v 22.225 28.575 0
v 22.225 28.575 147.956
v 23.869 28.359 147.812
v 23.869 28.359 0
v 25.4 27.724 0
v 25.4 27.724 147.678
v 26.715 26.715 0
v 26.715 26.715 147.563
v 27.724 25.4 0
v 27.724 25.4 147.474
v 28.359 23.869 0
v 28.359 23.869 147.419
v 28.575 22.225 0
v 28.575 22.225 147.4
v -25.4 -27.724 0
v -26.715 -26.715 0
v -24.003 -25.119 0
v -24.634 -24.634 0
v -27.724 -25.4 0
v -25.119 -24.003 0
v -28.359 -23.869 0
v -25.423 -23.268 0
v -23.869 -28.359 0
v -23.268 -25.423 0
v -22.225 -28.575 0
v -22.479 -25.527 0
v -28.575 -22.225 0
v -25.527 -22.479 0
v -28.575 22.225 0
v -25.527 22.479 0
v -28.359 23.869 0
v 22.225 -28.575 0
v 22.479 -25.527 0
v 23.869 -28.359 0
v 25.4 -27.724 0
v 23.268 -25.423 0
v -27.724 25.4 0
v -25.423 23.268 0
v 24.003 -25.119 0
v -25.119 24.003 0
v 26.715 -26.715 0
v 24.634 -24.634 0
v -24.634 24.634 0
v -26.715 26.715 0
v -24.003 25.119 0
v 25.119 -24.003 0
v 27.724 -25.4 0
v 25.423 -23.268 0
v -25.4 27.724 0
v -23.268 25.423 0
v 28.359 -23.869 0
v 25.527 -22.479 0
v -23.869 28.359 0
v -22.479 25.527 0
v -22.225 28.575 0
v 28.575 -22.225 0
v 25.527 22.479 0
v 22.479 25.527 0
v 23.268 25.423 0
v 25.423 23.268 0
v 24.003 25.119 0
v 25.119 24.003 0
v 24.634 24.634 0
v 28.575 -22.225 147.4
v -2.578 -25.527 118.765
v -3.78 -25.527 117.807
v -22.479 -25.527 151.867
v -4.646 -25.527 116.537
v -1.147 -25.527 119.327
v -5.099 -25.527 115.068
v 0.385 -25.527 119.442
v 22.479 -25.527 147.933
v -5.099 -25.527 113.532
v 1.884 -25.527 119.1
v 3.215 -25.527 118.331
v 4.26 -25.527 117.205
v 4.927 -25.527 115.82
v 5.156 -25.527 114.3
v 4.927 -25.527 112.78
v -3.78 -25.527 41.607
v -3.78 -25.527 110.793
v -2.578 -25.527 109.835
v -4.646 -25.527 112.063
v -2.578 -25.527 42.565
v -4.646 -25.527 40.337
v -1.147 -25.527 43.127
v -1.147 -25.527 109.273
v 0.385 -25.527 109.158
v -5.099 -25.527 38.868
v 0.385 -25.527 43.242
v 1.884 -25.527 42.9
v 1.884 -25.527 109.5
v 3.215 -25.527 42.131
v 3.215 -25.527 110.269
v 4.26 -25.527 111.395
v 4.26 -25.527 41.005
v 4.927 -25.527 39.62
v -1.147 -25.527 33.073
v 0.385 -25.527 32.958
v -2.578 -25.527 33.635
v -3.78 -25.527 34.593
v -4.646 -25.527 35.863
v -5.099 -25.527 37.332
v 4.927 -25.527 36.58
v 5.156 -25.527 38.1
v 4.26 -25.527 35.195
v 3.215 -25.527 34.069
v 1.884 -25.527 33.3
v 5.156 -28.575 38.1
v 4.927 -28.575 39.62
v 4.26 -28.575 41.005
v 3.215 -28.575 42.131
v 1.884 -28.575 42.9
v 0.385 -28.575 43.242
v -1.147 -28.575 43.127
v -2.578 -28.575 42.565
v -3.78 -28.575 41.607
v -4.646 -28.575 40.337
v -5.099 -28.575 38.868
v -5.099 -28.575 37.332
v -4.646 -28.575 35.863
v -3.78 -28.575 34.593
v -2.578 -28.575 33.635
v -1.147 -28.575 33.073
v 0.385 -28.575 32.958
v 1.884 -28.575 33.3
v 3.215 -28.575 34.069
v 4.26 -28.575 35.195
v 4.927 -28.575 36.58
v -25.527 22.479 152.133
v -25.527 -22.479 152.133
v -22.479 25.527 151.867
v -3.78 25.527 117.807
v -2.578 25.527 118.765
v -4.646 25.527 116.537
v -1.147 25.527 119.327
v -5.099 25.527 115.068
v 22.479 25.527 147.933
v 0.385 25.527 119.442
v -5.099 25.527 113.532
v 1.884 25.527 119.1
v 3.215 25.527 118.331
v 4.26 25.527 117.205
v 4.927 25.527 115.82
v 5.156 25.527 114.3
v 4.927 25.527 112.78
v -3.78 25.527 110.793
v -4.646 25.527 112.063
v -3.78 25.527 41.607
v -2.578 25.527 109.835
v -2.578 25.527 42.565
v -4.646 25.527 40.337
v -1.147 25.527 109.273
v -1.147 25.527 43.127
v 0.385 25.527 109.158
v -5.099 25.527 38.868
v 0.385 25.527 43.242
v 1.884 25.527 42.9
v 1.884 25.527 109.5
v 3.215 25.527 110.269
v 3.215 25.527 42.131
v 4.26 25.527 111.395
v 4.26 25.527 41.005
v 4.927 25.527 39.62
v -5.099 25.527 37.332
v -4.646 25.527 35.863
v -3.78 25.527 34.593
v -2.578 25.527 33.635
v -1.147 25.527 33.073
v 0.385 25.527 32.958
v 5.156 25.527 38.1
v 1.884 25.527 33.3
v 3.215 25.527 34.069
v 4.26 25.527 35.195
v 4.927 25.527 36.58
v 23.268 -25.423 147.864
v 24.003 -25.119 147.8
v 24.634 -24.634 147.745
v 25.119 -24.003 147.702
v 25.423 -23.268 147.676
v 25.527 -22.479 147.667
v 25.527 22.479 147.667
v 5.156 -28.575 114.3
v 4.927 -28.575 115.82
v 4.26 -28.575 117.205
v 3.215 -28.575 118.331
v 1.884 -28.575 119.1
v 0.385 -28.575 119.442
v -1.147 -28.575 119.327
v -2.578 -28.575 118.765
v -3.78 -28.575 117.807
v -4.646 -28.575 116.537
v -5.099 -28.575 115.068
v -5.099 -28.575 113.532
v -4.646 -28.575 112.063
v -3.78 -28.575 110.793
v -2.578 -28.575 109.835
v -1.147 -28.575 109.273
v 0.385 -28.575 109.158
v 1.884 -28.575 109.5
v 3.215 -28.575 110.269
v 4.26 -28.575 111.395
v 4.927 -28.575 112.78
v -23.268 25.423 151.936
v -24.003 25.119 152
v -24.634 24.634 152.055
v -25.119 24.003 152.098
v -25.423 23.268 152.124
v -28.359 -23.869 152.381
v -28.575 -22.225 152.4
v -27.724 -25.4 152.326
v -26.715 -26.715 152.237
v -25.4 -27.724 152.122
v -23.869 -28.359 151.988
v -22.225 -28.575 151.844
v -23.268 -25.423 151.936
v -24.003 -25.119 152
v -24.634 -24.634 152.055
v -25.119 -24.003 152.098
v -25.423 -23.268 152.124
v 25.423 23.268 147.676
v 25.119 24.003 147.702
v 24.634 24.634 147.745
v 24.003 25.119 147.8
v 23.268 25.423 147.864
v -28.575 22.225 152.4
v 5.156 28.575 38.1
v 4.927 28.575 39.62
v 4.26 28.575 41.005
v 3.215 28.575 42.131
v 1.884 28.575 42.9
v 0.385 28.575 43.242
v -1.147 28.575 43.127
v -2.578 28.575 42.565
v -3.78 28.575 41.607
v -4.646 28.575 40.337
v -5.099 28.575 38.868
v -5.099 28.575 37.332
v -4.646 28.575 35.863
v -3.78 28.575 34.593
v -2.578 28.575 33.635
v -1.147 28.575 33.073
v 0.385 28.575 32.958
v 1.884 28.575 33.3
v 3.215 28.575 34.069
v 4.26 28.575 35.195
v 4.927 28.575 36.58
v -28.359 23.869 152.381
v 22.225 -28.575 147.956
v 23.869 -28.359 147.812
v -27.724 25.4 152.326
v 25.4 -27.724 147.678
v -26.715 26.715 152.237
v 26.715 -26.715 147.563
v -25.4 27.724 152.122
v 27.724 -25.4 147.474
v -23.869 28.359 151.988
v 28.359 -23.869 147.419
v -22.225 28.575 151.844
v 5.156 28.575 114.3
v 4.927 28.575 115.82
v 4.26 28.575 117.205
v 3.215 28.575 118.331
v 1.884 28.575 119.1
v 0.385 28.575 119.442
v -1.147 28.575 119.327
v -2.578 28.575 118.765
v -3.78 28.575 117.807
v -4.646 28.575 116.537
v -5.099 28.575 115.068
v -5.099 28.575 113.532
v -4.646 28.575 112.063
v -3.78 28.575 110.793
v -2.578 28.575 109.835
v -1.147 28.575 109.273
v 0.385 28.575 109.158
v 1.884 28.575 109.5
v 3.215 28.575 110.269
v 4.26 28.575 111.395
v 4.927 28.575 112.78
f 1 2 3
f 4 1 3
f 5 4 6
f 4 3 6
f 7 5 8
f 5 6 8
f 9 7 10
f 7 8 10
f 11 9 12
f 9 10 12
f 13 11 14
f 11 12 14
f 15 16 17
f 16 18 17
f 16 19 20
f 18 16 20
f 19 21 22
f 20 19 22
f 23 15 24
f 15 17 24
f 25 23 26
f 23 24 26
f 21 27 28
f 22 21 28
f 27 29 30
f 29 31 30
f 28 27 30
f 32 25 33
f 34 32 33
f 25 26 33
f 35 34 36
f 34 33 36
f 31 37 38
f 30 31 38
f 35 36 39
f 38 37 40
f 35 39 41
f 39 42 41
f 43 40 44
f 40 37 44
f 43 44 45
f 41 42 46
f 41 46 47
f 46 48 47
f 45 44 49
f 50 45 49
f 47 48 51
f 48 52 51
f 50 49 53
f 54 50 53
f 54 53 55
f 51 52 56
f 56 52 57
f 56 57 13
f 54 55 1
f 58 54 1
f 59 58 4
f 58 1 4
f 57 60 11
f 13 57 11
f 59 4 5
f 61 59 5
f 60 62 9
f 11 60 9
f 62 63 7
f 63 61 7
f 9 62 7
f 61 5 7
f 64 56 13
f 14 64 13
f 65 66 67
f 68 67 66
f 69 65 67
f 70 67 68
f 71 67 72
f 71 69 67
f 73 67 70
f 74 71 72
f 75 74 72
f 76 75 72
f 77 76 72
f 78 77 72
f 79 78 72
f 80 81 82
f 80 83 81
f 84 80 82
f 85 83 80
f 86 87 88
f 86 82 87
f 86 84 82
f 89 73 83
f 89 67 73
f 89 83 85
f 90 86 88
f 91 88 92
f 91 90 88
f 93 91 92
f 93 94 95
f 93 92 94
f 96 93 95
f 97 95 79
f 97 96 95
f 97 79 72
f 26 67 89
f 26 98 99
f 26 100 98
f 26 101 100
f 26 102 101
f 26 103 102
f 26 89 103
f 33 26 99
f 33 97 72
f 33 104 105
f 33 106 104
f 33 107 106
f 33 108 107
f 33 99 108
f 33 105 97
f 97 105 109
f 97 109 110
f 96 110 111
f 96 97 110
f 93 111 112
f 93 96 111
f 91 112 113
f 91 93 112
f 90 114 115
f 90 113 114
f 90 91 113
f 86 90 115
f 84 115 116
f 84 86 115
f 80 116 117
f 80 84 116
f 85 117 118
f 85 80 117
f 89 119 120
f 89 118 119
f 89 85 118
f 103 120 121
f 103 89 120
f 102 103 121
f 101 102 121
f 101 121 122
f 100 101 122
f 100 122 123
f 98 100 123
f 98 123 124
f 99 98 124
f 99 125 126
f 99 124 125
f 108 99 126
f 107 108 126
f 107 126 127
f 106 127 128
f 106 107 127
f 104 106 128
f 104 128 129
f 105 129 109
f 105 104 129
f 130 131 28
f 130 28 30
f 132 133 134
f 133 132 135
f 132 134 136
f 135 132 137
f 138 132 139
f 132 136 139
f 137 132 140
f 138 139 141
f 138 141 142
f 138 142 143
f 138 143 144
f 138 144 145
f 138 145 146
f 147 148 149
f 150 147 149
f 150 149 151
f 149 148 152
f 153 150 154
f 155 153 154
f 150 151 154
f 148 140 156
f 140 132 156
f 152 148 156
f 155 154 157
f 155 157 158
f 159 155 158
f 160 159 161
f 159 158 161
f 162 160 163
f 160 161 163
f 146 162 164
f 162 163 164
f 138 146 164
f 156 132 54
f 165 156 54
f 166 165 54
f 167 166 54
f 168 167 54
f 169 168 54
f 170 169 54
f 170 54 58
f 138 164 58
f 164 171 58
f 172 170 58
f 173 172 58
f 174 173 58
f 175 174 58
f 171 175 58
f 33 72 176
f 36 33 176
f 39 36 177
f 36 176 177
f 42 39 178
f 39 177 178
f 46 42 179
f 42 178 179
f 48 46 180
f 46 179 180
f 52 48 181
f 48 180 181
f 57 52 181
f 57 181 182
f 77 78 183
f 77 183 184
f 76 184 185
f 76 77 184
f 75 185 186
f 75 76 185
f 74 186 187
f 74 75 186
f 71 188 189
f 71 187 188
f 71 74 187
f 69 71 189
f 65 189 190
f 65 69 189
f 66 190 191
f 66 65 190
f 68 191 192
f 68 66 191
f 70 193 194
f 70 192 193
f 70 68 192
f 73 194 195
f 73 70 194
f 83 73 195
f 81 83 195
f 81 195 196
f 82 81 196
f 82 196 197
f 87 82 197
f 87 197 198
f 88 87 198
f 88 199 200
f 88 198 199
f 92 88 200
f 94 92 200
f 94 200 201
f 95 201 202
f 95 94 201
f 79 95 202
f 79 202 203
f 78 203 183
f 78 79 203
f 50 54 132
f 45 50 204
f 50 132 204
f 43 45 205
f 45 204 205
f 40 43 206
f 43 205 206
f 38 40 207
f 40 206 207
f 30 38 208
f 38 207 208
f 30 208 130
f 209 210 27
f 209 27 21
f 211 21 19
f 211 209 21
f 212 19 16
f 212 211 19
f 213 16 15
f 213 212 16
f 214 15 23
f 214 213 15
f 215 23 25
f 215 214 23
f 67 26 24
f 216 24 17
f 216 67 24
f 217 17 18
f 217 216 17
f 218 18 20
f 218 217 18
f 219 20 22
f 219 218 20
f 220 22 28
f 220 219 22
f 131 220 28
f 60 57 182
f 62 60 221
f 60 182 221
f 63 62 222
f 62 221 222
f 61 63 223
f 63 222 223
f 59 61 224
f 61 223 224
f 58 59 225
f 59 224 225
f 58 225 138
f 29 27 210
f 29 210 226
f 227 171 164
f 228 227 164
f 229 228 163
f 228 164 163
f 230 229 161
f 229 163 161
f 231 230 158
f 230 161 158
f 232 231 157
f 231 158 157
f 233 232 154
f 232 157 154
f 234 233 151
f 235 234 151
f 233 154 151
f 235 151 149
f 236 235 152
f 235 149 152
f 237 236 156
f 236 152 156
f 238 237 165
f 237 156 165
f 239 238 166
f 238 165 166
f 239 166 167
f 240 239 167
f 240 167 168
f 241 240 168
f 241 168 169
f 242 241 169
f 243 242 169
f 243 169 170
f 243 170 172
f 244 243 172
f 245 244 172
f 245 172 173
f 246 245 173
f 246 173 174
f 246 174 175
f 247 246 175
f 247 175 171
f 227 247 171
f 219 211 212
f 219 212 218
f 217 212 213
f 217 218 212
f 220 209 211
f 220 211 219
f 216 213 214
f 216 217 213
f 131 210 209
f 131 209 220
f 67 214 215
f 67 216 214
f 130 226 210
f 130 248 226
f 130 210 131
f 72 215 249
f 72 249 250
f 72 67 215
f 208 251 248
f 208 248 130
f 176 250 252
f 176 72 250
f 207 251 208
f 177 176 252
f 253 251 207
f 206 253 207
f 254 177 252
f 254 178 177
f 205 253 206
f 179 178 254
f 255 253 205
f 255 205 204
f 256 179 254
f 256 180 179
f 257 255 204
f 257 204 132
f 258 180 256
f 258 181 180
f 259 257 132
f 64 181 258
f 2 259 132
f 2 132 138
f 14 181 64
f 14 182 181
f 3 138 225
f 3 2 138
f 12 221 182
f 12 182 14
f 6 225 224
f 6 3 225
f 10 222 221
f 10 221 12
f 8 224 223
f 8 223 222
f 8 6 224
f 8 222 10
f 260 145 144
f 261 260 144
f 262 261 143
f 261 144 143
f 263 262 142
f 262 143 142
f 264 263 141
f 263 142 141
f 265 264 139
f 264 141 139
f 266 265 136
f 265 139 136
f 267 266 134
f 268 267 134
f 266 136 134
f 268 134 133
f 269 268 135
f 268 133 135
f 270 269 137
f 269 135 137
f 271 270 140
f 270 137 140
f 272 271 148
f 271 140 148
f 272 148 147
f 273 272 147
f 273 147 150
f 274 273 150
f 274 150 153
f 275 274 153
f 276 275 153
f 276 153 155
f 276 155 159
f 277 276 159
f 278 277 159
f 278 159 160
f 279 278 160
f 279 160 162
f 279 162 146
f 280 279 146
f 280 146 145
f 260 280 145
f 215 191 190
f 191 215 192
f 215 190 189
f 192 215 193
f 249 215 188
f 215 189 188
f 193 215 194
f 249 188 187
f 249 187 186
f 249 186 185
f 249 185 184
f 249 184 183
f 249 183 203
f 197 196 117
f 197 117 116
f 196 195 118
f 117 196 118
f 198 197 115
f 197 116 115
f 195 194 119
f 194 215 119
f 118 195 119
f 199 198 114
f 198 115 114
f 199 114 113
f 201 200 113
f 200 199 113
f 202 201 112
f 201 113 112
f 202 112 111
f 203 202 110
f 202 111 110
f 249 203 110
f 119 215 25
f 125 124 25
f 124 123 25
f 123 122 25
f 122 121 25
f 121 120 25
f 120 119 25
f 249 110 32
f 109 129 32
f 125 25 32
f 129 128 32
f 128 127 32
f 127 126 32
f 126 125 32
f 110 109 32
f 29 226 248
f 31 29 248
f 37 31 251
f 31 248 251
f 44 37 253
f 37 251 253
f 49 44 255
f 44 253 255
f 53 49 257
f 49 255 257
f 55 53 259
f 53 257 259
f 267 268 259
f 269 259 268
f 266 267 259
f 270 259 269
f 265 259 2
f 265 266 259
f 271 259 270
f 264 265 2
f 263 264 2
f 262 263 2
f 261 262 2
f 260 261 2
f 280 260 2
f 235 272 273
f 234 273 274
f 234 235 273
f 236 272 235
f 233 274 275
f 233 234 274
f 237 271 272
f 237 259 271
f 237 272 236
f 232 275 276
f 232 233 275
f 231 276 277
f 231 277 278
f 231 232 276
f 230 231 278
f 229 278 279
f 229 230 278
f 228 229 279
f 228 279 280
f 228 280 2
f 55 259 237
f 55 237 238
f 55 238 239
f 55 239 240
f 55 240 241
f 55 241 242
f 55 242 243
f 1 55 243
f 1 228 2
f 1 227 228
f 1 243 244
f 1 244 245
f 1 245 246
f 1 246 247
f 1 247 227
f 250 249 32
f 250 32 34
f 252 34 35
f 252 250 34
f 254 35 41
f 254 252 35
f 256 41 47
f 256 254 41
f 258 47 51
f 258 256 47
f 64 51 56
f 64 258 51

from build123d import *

# Parameters (mm, degrees)
F0_W          = 57.15
F0_H          = 57.15
F0_W_2        = 51.054
F0_H_2        = 51.054
F1_DEPTH      = 152.4
F2_R          = 3.048
F3_R          = 6.35
F5_DEPTH      = 28.576
F5_DEPTH_BACK = 28.576
F6_R          = 5.1562
F7_DEPTH      = 28.576
F7_DEPTH_BACK = 28.576


with BuildPart() as f1:
    # F0 (on Top) → F1 (new body)
    with BuildSketch(Plane.XY):
        Rectangle(F0_W, F0_H)
        Rectangle(F0_W_2, F0_H_2, mode=Mode.SUBTRACT)
    extrude(amount=F1_DEPTH)

    # F2
    f2_edges = [f1.edges().sort_by_distance(p)[0] for p in [
        (25.527, 25.527, 76.2),
        (-25.527, 25.527, 76.2),
        (-25.527, -25.527, 76.2),
        (25.527, -25.527, 76.2),
    ]]
    fillet(f2_edges, radius=F2_R)

    # F3
    f3_edges = [f1.edges().sort_by_distance(p)[0] for p in [
        (-28.575, 28.575, 76.2),
        (-28.575, -28.575, 76.2),
        (28.575, -28.575, 76.2),
        (28.575, 28.575, 76.2),
    ]]
    fillet(f3_edges, radius=F3_R)

    # F4 (on Front) → F5 (cut, two sides)
    with BuildSketch(Plane.XZ) as f5_sk:
        Polygon((-28.575, 152.4), (28.575, 147.4000228795), (28.575, 152.4), align=None)
    extrude(amount=-F5_DEPTH, mode=Mode.SUBTRACT)
    extrude(f5_sk.sketch, amount=F5_DEPTH_BACK, mode=Mode.SUBTRACT)

    # F6 (on Front) → F7 (cut, two sides)
    with BuildSketch(Plane.XZ) as f7_sk:
        with Locations((0, 114.3)):
            Circle(F6_R)
        with Locations((0, 38.1)):
            Circle(F6_R)
    extrude(amount=F7_DEPTH, mode=Mode.SUBTRACT)
    extrude(f7_sk.sketch, amount=-F7_DEPTH_BACK, mode=Mode.SUBTRACT)


solid = f1.part
